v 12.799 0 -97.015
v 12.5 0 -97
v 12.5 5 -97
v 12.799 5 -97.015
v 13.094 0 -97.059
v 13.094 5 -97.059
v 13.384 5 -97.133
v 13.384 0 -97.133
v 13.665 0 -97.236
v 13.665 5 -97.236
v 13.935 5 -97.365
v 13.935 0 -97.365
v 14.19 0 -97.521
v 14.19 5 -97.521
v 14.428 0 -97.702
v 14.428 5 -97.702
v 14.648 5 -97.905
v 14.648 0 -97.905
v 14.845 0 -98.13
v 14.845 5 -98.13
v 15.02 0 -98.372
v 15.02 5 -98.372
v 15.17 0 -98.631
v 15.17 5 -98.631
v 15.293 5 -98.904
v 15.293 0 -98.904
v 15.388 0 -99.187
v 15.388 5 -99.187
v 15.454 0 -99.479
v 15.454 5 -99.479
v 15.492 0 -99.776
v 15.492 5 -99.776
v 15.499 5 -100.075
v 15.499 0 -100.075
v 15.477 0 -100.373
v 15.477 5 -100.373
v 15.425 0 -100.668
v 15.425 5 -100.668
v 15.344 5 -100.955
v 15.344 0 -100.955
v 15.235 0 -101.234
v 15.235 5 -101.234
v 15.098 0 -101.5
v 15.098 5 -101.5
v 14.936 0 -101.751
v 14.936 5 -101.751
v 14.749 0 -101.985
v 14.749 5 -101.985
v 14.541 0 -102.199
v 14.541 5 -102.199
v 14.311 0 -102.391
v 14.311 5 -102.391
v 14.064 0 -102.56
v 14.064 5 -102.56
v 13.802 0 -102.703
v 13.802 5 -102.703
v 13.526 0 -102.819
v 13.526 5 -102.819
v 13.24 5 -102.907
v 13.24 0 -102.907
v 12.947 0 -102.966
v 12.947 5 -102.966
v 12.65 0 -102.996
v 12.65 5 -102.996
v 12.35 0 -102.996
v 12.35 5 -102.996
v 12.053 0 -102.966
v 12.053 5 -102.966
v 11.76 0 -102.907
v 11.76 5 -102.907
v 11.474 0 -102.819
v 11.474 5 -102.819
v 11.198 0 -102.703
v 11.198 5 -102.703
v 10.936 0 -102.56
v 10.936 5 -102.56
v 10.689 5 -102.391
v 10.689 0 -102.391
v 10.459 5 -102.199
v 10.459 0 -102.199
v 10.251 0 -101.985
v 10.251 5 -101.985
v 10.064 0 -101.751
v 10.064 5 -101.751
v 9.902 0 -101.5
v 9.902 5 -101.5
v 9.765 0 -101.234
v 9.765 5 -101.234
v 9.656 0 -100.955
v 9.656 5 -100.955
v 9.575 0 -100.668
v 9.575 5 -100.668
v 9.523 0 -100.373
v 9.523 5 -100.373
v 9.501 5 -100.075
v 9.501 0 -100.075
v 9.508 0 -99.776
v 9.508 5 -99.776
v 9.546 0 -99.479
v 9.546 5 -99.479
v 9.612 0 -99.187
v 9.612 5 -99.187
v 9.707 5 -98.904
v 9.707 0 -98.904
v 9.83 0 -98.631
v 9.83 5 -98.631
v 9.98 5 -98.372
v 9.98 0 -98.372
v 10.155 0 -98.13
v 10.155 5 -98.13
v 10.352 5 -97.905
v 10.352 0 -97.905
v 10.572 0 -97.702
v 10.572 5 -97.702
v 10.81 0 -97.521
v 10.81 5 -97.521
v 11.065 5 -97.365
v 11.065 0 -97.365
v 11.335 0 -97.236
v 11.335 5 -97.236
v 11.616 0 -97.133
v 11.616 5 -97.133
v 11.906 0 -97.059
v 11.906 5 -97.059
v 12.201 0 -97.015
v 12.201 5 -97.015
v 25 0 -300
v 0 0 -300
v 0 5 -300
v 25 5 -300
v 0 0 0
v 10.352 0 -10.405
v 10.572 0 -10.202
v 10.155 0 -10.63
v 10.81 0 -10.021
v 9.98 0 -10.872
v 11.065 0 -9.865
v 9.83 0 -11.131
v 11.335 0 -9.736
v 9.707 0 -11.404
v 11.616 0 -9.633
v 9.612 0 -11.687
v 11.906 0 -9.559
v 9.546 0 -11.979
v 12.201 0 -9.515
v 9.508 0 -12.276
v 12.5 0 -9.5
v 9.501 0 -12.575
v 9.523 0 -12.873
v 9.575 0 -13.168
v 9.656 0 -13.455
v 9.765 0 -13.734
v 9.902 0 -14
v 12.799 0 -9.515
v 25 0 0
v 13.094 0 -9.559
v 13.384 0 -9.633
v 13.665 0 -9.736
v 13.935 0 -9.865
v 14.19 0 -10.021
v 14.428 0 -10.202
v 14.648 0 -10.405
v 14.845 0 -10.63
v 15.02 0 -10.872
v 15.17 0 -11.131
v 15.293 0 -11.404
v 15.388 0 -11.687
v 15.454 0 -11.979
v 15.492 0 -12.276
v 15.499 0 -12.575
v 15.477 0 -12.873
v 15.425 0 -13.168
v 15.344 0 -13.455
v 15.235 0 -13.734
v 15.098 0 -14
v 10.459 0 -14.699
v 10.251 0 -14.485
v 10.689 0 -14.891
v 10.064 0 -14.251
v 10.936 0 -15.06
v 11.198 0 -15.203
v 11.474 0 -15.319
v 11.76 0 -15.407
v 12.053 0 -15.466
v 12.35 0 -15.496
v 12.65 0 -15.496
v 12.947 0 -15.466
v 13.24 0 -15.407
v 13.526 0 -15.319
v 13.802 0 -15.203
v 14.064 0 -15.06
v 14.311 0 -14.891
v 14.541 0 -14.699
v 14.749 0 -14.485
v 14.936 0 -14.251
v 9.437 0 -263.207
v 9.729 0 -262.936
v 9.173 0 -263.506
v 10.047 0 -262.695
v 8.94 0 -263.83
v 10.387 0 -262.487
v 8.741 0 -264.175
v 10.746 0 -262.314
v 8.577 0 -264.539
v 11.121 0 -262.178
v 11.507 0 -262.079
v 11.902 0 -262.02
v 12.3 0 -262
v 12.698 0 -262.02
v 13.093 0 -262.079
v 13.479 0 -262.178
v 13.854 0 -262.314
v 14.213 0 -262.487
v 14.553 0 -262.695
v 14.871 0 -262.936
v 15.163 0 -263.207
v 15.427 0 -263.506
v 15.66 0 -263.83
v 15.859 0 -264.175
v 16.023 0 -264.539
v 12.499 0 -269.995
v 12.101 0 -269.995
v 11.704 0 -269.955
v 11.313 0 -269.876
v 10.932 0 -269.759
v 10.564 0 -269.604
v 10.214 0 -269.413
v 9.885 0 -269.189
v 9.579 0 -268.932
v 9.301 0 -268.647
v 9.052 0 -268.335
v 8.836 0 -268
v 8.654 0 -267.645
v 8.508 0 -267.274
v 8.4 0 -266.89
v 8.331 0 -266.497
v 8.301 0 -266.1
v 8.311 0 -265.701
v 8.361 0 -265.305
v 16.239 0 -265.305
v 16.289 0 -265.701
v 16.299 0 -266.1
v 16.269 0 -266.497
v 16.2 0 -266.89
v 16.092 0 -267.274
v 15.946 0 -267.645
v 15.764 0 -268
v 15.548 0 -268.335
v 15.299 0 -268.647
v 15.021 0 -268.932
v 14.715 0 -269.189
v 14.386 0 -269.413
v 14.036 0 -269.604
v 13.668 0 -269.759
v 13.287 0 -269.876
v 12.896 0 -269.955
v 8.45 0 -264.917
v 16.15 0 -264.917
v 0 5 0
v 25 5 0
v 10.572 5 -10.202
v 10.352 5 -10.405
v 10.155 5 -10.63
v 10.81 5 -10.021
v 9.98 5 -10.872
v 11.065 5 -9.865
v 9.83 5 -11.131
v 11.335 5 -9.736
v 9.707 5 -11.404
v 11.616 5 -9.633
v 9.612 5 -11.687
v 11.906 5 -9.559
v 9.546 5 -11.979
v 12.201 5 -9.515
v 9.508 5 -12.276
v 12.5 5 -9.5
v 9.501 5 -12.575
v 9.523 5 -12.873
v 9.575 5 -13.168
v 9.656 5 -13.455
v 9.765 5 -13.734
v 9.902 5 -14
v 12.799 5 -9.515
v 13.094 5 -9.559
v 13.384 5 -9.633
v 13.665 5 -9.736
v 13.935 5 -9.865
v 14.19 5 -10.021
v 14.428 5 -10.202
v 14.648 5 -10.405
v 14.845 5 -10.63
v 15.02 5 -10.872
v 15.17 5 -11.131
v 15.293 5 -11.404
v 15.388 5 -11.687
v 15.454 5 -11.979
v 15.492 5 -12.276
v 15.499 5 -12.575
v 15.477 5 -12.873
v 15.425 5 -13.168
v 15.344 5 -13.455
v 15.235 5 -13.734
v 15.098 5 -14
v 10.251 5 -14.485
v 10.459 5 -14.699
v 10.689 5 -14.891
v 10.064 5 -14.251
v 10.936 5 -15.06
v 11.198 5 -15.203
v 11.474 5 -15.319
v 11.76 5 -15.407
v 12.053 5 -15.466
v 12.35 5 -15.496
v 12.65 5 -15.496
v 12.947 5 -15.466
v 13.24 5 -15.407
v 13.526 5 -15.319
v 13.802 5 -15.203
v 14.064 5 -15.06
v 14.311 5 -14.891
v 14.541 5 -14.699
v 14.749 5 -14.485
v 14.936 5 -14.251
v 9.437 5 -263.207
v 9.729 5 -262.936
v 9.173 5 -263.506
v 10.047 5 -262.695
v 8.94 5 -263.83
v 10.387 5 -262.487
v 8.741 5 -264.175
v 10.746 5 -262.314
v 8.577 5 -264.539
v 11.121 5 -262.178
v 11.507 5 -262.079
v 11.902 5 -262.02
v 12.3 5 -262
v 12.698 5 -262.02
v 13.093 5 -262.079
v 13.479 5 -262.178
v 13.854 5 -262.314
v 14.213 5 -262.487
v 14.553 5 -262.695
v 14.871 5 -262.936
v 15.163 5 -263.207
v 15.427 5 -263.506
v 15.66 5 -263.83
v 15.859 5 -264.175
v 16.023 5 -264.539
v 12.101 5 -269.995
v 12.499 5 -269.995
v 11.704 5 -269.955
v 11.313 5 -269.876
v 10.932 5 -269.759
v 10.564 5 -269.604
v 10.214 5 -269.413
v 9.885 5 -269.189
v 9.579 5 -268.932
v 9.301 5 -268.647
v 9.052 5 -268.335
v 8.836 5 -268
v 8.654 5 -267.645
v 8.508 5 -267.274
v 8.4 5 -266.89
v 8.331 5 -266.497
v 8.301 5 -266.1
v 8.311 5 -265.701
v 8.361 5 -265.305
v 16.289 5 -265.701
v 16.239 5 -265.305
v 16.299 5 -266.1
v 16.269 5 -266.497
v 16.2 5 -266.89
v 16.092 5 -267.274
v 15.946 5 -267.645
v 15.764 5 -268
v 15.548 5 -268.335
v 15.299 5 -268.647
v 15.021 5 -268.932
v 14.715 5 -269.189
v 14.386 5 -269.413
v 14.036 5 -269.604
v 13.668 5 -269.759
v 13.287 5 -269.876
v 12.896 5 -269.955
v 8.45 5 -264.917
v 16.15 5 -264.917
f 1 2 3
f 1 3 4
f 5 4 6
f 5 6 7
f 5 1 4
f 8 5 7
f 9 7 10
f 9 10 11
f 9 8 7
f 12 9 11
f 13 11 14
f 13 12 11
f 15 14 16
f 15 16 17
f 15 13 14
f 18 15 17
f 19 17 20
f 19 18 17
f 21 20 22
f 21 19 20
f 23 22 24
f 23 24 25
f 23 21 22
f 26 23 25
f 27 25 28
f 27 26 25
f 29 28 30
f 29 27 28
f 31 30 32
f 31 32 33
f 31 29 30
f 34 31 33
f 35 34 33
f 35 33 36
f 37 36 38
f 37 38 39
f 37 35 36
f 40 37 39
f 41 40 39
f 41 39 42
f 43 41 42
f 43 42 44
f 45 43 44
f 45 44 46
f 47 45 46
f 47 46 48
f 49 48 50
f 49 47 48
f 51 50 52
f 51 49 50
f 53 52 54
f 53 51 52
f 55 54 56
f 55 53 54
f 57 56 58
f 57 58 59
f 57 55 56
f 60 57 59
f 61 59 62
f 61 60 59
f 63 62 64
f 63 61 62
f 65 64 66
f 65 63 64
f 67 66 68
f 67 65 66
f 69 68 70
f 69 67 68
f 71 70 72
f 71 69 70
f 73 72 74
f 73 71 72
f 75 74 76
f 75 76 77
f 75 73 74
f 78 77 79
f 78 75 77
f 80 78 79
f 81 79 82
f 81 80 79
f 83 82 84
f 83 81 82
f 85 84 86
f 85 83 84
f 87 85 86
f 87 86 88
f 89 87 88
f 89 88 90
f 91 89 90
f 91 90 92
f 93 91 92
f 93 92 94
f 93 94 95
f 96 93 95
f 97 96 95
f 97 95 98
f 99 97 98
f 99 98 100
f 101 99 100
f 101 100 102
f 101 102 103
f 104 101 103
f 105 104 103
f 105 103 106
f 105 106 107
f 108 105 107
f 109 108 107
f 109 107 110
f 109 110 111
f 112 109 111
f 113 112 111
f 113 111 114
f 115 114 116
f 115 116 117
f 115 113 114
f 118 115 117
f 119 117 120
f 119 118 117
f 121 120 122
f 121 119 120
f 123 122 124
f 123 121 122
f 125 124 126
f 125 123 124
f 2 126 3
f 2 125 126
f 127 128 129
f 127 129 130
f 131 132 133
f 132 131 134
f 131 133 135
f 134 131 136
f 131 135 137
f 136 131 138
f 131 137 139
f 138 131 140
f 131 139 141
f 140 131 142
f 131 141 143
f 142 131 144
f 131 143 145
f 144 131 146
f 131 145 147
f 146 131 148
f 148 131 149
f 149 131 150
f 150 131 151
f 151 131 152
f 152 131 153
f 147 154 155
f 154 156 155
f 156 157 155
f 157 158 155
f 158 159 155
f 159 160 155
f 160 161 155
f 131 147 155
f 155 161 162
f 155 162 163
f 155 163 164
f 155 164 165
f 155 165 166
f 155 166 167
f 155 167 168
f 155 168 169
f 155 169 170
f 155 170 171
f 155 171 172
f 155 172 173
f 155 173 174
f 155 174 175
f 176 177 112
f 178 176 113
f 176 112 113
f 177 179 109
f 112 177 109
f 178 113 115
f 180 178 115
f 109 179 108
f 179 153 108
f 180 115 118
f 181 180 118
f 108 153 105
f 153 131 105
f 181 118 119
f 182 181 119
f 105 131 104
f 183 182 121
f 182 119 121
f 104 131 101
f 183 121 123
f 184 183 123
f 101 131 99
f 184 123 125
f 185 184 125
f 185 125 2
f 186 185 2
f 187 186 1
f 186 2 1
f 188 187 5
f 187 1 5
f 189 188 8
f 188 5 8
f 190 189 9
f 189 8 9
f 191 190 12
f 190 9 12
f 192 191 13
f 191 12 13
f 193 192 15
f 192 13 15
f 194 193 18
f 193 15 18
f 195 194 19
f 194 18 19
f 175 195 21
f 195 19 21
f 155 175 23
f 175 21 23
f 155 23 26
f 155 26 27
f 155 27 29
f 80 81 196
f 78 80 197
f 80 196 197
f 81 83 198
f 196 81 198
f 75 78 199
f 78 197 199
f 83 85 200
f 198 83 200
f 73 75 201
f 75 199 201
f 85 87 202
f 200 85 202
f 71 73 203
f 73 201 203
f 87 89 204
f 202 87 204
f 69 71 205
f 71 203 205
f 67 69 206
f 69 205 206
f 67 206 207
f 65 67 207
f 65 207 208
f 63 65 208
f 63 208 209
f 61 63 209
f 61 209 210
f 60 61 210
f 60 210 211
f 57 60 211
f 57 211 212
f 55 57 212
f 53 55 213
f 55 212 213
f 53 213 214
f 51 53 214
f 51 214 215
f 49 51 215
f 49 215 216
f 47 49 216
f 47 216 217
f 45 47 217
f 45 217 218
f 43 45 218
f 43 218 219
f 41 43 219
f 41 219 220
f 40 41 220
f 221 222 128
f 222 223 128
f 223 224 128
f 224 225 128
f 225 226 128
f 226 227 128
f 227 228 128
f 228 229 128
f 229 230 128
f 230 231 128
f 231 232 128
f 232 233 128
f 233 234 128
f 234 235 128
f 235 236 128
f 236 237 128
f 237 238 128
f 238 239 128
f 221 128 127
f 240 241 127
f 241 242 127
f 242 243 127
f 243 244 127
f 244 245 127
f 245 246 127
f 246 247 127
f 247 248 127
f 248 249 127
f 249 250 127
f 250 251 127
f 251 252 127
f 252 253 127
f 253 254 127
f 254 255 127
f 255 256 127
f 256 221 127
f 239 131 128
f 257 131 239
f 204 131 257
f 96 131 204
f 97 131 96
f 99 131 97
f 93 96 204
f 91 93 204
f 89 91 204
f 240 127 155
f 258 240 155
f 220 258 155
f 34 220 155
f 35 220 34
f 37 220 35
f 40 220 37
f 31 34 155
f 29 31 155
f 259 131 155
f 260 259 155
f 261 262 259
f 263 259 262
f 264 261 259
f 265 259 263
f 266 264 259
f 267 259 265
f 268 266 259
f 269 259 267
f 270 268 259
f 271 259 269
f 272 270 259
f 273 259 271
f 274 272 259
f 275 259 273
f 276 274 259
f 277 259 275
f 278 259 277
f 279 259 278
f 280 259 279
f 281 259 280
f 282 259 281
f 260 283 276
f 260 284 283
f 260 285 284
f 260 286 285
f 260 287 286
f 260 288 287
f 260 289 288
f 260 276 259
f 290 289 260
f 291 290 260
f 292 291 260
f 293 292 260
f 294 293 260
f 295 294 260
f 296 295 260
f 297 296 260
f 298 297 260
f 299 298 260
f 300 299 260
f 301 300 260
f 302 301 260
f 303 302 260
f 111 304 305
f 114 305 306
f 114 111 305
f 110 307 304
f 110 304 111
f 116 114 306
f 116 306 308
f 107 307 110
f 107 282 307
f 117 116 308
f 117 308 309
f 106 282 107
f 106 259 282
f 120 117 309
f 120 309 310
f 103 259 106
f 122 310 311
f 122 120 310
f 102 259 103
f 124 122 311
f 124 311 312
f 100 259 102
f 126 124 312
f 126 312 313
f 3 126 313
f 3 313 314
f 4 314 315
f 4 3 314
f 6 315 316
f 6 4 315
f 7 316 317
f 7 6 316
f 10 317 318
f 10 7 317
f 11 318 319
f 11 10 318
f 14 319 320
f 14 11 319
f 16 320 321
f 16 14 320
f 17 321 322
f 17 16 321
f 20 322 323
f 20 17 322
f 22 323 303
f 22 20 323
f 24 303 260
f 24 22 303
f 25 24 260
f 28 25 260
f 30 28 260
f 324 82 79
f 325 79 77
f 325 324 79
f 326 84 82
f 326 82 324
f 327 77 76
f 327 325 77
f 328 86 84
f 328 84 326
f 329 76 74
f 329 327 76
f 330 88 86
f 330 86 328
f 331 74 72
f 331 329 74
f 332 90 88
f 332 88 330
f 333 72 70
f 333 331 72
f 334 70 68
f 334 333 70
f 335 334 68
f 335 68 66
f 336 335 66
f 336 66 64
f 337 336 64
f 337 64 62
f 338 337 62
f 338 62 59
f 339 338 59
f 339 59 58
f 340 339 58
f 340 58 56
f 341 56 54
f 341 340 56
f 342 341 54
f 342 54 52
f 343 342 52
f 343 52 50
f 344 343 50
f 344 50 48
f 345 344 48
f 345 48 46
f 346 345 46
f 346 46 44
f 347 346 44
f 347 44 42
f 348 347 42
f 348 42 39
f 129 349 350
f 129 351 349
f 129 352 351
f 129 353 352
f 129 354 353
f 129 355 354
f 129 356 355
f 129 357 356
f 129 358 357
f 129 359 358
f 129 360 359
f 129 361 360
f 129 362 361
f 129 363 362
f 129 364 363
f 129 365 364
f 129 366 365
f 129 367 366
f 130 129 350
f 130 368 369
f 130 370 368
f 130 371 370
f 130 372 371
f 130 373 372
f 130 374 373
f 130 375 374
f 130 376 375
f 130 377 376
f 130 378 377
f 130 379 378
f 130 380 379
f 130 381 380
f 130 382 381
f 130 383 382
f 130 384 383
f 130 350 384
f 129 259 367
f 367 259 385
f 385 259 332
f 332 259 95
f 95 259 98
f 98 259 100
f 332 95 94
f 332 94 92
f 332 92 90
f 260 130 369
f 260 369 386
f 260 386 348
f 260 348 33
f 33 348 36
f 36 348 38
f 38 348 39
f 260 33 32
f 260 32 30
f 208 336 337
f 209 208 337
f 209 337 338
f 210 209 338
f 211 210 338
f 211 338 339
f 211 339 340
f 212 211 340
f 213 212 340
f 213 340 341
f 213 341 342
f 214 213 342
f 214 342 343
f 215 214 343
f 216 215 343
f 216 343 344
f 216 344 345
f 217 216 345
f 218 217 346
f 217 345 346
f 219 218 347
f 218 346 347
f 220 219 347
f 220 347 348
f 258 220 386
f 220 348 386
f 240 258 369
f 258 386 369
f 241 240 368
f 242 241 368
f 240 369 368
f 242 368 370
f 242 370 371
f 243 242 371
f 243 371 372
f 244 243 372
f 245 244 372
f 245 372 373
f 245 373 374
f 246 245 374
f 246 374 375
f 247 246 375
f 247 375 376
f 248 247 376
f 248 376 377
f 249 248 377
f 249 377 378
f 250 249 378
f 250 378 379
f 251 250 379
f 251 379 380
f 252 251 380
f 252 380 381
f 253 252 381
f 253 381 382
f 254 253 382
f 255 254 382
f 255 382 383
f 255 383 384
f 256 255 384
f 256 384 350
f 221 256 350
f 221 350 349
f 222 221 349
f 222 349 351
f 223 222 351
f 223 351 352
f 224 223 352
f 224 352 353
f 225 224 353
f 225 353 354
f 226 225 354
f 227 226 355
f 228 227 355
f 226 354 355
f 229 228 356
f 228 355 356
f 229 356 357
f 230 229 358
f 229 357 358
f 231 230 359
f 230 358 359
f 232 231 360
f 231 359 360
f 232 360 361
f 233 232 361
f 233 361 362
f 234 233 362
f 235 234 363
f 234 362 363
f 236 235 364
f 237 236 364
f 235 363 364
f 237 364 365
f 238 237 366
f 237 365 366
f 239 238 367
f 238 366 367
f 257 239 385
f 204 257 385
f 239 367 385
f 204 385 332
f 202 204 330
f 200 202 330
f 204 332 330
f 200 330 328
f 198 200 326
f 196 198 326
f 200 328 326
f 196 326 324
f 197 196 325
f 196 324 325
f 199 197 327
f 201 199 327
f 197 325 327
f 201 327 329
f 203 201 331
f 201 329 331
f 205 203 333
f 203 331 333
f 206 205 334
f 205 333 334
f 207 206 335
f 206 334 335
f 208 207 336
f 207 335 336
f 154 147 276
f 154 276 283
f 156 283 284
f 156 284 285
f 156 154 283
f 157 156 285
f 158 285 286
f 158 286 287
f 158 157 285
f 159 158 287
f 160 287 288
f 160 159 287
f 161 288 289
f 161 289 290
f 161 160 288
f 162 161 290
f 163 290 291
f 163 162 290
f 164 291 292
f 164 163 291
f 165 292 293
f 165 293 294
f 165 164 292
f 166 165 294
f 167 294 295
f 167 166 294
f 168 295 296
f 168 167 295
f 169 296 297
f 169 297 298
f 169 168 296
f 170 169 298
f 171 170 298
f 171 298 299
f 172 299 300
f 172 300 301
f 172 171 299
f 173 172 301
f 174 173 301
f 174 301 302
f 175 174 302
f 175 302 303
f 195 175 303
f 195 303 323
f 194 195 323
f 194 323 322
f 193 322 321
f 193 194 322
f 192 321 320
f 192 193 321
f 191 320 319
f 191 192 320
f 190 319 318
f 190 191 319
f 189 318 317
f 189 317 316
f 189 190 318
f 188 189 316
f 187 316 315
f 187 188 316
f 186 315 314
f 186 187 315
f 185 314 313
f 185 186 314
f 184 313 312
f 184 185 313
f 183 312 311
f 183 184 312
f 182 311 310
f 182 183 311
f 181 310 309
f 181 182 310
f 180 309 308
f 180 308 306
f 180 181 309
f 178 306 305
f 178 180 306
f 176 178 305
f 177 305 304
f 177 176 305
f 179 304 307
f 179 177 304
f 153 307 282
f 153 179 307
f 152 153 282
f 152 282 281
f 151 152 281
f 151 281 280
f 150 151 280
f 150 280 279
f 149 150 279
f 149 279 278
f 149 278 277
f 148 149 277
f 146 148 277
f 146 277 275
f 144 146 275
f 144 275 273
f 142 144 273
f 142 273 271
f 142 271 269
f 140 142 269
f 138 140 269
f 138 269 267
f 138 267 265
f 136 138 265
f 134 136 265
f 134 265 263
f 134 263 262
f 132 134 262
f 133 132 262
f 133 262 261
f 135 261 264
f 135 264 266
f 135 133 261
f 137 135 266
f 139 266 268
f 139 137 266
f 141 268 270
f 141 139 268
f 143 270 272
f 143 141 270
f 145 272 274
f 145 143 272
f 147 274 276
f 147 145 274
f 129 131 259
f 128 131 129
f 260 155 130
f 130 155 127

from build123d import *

# Parameters (mm, degrees)
SKETCH1_W           = 25
SKETCH1_H           = 300
SKETCH1_R           = 3
BOSS_EXTRUDE1_DEPTH = 5
SKETCH2_R           = 4
CUT_EXTRUDE1_DEPTH  = 302.081384346


with BuildPart() as part:
    # Sketch1 → Boss-Extrude1 (new body)
    with BuildSketch(Plane(origin=(0, 0, 0), x_dir=(1, 0, 0), z_dir=(0, 1, 0))):
        with Locations((12.5, 150)):
            Rectangle(SKETCH1_W, SKETCH1_H)
        with Locations(Location((12.5, 12.5, 0), (0, 0, 270))):
            Circle(SKETCH1_R, mode=Mode.SUBTRACT)
        with Locations(Location((12.5, 100, 0), (0, 0, 270))):
            Circle(SKETCH1_R, mode=Mode.SUBTRACT)
    extrude(amount=BOSS_EXTRUDE1_DEPTH)

    # Sketch2 → Cut-Extrude1 (cut, through all)
    with BuildSketch(Plane(origin=(0, 5, 0), x_dir=(1, 0, 0), z_dir=(0, 1, 0))):
        with Locations(Location((12.3, 266, 0), (0, 0, 270))):
            Circle(SKETCH2_R)
    extrude(amount=-CUT_EXTRUDE1_DEPTH, mode=Mode.SUBTRACT)


solid = part.part
